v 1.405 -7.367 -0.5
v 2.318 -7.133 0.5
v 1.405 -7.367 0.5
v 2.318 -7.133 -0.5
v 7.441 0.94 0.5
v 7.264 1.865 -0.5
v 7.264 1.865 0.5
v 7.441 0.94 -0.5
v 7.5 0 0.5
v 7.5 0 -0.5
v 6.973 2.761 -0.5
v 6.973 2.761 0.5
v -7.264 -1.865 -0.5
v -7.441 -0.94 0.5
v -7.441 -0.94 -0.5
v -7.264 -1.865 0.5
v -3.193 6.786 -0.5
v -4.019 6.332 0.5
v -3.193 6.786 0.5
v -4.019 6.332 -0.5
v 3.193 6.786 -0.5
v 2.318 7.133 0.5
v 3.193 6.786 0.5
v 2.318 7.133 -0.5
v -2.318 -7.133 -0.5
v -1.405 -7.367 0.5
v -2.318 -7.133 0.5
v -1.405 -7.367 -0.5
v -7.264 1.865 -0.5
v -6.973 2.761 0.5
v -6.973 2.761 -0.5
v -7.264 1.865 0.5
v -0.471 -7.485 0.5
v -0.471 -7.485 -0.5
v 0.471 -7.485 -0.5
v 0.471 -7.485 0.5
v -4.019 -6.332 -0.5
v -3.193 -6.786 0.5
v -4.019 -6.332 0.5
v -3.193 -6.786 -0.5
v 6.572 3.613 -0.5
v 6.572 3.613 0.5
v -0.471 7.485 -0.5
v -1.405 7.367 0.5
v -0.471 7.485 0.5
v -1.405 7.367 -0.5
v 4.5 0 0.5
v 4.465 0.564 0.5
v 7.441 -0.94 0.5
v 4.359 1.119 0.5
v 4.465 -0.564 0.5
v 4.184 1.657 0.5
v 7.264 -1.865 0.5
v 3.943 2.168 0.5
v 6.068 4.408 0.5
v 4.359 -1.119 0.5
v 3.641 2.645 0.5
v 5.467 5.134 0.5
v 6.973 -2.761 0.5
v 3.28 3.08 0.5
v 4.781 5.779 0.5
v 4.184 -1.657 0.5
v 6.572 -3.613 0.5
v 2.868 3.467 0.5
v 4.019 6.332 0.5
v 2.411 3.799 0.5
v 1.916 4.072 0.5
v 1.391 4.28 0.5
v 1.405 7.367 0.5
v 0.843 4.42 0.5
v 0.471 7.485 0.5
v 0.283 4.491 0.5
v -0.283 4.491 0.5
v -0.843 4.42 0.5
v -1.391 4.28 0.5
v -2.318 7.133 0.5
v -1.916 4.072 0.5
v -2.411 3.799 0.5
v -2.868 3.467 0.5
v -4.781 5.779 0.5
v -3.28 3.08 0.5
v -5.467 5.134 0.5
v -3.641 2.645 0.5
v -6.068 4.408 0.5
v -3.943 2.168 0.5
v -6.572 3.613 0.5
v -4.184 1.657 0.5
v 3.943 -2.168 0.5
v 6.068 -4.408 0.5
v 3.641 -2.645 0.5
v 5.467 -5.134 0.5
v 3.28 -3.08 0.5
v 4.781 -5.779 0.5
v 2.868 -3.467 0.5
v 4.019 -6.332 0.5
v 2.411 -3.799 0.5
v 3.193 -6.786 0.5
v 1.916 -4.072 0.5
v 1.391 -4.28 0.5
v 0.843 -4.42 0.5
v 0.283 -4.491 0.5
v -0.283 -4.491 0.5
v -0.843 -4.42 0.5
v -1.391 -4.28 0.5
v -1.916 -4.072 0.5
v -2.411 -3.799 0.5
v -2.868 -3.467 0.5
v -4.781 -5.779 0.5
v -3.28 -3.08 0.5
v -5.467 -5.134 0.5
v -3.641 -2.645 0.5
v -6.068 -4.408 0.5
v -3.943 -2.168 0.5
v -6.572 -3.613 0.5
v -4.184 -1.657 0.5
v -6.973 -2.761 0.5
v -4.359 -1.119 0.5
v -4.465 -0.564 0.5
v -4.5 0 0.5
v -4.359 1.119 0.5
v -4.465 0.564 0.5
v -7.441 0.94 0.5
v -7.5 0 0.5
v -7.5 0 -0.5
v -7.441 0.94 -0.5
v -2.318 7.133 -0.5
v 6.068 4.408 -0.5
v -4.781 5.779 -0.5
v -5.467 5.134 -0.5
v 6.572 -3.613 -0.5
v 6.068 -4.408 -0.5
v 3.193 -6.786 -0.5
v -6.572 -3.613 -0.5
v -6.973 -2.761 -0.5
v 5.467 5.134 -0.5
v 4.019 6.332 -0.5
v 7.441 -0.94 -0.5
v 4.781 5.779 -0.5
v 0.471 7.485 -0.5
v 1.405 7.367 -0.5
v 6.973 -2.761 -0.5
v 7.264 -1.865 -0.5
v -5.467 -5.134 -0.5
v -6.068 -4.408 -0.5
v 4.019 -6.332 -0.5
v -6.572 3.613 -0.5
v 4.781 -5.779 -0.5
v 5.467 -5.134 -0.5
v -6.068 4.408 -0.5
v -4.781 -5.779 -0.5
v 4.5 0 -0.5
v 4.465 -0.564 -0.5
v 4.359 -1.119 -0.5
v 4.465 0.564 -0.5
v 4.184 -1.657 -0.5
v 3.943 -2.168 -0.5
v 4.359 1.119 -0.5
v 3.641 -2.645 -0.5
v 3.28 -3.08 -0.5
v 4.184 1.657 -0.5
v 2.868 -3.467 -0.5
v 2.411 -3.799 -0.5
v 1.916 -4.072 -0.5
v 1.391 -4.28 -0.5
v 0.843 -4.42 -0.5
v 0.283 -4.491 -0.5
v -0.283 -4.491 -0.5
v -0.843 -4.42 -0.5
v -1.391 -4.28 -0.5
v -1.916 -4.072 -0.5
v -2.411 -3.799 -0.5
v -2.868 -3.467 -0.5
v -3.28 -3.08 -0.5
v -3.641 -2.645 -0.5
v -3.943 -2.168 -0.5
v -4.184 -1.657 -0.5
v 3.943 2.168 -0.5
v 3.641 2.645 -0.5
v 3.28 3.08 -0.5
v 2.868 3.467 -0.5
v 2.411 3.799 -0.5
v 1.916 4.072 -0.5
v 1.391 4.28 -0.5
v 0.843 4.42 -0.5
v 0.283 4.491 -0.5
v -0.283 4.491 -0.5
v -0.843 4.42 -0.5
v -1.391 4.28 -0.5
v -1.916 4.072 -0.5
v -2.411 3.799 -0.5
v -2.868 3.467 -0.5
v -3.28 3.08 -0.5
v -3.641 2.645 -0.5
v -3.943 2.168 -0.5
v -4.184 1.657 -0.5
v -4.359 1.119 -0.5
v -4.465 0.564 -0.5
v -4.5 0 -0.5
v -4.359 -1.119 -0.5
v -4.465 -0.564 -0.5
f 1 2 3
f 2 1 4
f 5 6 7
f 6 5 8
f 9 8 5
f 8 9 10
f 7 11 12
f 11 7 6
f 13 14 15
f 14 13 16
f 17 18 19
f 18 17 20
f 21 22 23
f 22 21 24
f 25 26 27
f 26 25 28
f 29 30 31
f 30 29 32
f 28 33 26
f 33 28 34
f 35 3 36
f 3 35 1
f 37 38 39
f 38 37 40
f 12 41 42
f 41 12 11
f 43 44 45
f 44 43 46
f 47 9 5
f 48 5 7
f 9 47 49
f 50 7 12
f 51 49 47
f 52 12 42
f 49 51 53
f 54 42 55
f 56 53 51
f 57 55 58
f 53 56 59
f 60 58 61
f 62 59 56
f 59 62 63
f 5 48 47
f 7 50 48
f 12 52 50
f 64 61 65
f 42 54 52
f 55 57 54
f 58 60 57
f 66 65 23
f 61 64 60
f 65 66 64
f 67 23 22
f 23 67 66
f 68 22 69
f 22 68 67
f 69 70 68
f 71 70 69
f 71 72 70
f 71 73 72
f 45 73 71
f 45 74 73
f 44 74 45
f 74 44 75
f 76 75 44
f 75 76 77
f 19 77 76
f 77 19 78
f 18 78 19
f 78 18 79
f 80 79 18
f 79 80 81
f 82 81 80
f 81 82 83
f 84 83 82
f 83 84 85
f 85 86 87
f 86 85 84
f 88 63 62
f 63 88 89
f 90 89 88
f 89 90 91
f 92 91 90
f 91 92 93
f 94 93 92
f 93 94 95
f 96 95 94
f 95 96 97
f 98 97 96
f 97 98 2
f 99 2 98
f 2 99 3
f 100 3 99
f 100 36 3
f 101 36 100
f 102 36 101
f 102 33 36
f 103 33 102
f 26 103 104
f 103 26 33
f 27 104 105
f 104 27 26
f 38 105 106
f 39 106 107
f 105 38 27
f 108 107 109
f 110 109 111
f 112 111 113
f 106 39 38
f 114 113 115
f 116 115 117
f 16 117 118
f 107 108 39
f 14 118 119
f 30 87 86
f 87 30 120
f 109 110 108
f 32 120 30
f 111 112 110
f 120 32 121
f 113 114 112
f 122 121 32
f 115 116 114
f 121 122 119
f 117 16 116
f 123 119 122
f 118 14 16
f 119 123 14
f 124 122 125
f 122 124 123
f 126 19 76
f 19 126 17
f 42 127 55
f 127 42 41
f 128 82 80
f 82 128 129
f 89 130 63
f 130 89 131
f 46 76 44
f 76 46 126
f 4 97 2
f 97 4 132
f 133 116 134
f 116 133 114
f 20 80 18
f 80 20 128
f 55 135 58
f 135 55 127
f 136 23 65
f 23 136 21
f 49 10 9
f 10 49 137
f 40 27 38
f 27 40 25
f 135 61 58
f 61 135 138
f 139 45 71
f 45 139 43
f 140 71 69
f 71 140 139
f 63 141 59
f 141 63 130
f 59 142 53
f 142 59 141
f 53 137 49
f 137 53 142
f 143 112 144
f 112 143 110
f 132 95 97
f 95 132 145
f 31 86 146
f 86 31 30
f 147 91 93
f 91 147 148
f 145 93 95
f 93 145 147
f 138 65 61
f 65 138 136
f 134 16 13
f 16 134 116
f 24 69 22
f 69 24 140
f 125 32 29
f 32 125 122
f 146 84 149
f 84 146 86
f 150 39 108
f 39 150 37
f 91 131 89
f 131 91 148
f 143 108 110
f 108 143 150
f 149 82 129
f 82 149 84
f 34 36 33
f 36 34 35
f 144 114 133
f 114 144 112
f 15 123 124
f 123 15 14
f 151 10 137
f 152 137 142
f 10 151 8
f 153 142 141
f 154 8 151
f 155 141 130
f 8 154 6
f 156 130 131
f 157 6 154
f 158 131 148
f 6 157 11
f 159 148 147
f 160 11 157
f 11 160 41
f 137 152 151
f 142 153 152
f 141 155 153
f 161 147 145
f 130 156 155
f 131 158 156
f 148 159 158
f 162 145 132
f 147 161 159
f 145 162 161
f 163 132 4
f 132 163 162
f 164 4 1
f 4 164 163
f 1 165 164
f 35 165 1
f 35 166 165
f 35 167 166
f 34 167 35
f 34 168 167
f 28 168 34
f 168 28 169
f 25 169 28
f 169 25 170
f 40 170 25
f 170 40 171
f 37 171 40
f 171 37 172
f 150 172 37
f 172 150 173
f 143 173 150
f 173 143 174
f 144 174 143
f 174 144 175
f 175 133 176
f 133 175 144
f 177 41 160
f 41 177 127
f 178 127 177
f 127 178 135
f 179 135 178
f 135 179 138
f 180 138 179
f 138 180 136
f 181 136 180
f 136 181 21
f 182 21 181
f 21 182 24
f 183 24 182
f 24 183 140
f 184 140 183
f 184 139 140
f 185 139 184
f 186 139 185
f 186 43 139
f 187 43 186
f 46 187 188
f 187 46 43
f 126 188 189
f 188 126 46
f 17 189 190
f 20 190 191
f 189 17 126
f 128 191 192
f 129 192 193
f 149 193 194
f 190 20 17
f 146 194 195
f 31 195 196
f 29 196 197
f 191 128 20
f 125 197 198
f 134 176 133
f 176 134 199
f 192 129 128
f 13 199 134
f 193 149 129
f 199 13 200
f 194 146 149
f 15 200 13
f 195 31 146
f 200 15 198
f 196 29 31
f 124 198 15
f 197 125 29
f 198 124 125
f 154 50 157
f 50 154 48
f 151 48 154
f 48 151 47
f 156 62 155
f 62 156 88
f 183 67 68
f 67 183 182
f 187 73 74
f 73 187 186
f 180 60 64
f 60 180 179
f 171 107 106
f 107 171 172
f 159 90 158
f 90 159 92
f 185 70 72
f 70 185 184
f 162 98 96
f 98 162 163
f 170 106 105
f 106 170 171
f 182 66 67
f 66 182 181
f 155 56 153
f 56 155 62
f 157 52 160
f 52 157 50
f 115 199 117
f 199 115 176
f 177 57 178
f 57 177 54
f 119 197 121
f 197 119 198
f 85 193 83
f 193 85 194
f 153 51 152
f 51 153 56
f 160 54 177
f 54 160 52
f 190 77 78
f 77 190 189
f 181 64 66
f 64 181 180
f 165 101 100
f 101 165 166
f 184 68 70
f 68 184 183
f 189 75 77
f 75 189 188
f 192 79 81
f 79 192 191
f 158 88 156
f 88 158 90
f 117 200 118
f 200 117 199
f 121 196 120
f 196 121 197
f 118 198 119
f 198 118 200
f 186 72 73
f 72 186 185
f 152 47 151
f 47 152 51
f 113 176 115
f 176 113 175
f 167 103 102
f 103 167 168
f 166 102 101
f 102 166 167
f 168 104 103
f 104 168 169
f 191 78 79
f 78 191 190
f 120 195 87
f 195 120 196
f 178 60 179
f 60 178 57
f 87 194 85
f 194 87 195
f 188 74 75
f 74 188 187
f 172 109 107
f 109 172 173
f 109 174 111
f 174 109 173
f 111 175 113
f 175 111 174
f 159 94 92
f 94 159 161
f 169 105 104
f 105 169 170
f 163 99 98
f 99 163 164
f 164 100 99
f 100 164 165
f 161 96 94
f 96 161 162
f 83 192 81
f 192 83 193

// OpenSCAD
$fn = 50;


difference() {
	union() {
		translate(v = [0, 0, -0.5000000000]) {
			cylinder(h = 1, r = 7.5000000000);
		}
	}
	union() {
		translate(v = [0, 0, -100.0000000000]) {
			cylinder(h = 200, r = 4.5000000000);
		}
	}
}
